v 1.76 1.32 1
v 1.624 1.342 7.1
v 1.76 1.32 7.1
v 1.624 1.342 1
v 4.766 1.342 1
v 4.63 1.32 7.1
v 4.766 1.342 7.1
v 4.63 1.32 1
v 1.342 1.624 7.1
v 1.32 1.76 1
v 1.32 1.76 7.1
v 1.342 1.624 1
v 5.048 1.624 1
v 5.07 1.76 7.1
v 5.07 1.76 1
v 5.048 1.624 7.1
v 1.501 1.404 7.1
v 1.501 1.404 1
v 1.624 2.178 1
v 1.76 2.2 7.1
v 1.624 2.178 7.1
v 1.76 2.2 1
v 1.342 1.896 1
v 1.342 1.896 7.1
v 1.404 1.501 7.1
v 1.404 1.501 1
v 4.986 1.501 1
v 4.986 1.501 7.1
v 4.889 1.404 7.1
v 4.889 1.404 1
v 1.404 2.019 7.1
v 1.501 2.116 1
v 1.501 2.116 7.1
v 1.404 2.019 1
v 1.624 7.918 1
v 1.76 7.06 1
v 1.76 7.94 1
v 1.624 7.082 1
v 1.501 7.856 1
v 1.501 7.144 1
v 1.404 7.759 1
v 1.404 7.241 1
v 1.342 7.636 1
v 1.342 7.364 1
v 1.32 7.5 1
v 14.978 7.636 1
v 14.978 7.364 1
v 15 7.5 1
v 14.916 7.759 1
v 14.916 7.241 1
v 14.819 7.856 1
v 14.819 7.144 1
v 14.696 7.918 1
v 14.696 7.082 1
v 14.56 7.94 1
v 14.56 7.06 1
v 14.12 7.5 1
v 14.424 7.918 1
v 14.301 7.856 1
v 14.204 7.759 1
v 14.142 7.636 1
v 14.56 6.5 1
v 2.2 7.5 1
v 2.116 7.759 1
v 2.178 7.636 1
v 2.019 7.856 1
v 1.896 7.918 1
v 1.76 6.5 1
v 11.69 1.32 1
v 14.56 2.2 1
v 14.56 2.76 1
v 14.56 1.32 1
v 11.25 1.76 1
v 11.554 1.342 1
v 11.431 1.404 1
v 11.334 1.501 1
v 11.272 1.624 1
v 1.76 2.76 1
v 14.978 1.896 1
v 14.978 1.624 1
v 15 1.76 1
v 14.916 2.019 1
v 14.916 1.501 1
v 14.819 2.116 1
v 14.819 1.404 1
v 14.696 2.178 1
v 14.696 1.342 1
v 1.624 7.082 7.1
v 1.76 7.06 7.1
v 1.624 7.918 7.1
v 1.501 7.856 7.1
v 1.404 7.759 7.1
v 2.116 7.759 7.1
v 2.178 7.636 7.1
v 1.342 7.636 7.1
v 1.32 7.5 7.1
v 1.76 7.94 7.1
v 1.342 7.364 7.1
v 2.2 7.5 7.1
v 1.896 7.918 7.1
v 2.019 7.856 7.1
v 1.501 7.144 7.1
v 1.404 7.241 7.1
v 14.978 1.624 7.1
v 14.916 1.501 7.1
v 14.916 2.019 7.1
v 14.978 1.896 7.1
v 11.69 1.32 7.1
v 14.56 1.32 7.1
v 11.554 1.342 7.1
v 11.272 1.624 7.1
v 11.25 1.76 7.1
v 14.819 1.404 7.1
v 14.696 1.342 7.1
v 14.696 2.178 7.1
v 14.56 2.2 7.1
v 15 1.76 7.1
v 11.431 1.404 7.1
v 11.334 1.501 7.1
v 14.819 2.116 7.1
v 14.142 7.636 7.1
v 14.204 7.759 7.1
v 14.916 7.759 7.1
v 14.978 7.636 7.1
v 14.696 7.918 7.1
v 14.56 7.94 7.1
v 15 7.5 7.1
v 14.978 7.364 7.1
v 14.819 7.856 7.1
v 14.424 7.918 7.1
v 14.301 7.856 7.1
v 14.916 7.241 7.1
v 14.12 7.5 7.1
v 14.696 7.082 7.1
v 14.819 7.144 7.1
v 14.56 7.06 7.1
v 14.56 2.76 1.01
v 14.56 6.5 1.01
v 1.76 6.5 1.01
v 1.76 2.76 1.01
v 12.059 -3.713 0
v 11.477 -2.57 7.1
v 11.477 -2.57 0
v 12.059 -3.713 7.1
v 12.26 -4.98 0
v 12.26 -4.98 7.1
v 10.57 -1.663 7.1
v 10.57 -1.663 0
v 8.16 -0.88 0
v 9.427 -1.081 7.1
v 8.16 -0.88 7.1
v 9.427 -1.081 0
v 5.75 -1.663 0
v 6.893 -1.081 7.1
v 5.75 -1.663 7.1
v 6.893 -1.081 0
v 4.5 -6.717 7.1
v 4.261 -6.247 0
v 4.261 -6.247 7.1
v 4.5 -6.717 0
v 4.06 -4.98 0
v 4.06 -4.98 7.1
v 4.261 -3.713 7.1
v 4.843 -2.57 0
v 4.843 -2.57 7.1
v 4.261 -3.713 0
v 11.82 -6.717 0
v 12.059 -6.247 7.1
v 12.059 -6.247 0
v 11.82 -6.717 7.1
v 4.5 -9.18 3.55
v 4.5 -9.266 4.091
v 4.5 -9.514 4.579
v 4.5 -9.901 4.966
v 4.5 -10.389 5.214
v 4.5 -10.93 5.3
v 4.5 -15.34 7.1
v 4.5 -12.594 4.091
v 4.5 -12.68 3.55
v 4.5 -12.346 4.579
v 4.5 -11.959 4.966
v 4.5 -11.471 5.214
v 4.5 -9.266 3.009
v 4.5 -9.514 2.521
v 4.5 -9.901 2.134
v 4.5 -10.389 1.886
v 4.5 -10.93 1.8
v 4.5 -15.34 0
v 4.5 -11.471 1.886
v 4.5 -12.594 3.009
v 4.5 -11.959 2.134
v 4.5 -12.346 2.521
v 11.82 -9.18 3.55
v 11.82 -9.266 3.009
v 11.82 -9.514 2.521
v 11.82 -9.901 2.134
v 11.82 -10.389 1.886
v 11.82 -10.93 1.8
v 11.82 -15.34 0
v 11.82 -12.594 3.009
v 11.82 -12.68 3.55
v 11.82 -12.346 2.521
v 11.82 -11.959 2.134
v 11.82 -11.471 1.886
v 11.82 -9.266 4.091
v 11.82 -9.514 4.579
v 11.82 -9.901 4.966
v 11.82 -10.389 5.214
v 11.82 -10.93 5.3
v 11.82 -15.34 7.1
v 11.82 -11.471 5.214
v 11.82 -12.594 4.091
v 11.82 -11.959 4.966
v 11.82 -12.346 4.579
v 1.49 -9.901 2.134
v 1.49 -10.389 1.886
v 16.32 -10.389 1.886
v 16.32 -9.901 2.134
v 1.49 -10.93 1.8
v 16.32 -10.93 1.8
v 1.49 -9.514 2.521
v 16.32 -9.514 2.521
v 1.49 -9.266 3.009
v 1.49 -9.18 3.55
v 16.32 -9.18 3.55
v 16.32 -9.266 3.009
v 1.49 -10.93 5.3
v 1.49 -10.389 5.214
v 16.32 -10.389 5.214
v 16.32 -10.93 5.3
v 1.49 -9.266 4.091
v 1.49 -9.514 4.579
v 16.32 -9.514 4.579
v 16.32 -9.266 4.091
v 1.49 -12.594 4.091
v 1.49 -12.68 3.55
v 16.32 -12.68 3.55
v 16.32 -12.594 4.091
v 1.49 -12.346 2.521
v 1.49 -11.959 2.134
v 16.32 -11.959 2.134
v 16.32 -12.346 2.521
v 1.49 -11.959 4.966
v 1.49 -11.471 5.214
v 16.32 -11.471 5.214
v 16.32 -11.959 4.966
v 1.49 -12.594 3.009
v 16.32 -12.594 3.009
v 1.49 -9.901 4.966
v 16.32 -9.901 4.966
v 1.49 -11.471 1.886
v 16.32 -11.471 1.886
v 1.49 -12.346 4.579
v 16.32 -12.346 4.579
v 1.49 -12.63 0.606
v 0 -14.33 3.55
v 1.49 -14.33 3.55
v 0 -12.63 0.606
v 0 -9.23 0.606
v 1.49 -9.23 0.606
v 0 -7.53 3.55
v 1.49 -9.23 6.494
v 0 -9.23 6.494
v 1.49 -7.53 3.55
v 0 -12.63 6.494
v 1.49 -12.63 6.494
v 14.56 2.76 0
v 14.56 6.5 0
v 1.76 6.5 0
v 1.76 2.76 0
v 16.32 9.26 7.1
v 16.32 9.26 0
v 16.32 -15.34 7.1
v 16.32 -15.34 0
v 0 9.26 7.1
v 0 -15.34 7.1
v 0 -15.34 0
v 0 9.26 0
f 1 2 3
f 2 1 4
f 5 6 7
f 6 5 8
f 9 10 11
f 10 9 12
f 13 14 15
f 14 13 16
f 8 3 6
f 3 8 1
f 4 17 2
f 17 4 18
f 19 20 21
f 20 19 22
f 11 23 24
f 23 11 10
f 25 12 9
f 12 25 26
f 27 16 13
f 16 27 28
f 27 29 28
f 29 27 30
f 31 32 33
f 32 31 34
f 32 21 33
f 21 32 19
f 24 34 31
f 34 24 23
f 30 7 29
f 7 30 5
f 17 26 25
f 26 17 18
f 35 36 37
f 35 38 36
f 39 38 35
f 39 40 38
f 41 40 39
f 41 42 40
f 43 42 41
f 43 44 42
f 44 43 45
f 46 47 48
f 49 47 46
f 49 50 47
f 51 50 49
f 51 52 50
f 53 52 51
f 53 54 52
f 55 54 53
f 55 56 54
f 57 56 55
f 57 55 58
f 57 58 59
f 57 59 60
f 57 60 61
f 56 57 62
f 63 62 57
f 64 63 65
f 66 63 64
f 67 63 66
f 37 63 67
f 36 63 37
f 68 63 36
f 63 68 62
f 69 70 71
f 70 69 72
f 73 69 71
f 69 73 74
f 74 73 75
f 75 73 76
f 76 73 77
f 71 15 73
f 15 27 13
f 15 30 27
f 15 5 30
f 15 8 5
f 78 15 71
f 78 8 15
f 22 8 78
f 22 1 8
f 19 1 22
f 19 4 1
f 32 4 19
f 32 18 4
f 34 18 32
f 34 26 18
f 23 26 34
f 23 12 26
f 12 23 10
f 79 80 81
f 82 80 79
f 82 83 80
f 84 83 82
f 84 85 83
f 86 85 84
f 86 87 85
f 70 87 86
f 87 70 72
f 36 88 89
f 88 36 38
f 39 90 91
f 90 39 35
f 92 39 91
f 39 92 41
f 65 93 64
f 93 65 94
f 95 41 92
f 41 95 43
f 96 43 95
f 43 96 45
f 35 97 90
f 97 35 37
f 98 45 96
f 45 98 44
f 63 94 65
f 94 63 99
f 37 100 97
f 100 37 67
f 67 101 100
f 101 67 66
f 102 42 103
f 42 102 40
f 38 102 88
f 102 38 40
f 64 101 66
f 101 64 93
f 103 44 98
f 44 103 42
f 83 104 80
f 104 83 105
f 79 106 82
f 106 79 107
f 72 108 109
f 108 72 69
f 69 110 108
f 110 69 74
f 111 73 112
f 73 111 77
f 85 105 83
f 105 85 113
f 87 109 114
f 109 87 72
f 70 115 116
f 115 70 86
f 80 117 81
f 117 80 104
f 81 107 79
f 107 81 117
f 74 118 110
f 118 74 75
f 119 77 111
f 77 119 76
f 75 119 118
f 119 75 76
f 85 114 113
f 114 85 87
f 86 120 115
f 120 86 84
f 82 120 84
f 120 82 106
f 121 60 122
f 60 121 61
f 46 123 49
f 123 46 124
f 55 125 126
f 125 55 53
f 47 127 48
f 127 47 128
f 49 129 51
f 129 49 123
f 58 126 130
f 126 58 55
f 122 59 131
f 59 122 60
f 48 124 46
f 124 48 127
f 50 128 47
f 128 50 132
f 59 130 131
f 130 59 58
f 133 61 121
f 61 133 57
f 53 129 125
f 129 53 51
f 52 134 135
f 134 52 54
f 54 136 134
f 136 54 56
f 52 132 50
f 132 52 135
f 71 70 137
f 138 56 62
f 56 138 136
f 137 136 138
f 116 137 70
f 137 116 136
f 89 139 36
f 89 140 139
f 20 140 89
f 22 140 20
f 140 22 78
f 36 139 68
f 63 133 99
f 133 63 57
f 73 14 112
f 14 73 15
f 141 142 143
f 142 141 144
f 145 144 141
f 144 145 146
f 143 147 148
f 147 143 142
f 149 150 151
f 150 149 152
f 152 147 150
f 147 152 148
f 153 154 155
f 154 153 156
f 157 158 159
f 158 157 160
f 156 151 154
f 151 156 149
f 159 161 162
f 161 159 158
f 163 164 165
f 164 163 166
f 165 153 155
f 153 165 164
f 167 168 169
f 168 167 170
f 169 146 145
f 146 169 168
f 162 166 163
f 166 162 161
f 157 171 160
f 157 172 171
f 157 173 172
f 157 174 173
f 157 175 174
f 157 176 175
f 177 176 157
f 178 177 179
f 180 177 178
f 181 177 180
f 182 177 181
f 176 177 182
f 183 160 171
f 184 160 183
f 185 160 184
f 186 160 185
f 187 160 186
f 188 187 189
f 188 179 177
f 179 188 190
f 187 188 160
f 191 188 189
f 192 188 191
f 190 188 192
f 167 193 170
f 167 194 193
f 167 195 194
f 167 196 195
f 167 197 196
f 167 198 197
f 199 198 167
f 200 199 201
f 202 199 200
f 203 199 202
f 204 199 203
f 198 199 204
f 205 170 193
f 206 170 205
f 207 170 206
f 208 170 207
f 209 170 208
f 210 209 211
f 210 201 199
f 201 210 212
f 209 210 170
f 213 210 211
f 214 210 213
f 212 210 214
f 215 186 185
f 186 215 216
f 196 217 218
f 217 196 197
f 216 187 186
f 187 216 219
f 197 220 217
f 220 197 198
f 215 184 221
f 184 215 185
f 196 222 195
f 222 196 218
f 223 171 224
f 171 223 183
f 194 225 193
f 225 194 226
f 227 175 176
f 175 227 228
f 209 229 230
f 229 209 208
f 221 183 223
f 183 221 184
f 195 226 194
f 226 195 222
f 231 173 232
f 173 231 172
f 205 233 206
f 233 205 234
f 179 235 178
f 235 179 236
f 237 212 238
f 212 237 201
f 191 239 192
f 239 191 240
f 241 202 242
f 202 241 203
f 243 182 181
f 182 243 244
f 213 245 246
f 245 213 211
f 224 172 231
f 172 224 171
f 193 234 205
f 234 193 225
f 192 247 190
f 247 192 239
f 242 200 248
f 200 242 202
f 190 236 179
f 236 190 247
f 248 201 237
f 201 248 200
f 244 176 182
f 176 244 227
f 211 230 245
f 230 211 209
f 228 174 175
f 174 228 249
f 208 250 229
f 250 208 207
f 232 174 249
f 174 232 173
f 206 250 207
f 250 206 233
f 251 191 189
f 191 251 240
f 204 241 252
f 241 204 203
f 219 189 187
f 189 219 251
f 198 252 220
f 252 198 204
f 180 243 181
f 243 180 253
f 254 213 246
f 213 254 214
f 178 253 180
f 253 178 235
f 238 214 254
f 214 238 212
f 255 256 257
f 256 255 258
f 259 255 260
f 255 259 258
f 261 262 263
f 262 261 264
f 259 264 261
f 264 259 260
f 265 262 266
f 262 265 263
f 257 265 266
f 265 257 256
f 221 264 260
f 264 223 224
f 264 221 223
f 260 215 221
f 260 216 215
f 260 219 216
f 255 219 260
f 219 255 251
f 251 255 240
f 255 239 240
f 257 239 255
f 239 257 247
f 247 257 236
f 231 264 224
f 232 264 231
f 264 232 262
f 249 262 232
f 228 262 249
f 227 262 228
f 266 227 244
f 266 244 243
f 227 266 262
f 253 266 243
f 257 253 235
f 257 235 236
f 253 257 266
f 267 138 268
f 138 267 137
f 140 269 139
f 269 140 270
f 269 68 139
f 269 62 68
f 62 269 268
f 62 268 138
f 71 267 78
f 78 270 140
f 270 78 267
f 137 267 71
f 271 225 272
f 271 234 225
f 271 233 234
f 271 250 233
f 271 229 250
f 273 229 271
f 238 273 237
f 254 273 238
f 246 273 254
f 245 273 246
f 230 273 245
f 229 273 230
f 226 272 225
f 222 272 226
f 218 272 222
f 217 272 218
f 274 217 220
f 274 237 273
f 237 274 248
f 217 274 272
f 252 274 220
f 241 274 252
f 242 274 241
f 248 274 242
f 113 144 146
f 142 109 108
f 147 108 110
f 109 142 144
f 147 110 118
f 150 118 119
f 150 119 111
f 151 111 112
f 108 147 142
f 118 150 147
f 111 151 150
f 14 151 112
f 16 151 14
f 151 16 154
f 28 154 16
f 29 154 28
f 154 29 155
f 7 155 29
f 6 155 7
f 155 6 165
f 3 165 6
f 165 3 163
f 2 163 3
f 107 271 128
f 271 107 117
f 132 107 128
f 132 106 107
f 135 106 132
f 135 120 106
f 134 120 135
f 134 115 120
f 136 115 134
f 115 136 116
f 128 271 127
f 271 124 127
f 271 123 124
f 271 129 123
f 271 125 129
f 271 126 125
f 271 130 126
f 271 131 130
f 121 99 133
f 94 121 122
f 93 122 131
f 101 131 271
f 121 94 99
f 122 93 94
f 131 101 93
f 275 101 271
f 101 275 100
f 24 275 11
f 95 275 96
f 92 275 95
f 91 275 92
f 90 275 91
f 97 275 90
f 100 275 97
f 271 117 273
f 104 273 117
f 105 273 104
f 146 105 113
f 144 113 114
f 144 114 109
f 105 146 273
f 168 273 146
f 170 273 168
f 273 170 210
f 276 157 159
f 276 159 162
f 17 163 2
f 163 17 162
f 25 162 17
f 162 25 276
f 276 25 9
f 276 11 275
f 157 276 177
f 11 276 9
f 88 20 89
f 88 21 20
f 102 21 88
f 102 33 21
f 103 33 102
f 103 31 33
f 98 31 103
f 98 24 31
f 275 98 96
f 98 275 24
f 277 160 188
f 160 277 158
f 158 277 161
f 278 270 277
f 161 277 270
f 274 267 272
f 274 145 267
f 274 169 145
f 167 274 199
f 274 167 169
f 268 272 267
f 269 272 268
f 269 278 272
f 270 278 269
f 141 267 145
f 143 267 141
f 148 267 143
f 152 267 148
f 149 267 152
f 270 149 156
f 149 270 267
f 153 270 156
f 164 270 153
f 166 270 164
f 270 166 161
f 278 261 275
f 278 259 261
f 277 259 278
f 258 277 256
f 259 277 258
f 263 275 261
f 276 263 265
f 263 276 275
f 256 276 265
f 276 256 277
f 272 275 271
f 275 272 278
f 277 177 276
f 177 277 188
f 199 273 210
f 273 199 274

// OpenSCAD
// Used for mounting tiny microswitches with no lever
// Michel Pollet <buserror@gmail.com>
// Inspired by
// Ian Stratford <ginjaian@gmail.com>

// for 0.20mm layer, 0.35mm nozzle 00 this ensures "solid walls"
extrusionSize = 0.44;	// for 0.20mm layer

E = 0.01;
$fn = 20;

ms_size = [12.8, 5.74, 6.6]; // exact size = 12.8, 5.8, 6.6

m8_diameter = 8.2;
m3_diameter = 3.5;
m3_nut_diameter = 6.8; // normally 6.2mm
relief_hole_diameter = extrusionSize * 2;

WallW = 4 * extrusionSize;
BottomH = 1;

DistanceSwitchM8 = WallW / 2;
DistanceM3M8 = 0.1;	// the smaller, the better really
NutTrapDepth = 1.5;

ExtraHeight = -0.5;
ExtraLength = 
	m8_diameter + DistanceM3M8 + 
	(m3_nut_diameter/2) + WallW + 
	DistanceSwitchM8 + 1;

ms_outside_pos = [0,-ExtraLength,0];
ms_outside_size = [
	ms_size[0] + (2*WallW), 
	ms_size[1] + (2*WallW) + ExtraLength, 
	ms_size[2] + BottomH + ExtraHeight];
ms_inside_size = [ms_size[0], ms_size[1], ms_size[2] + E];
ms_inside_pos = [
	(ms_outside_size[0] / 2) - (ms_inside_size[0]/2),
	WallW + (ms_size[1] / 2) - (ms_inside_size[1]/2),
	BottomH ];

ms_pin_slot_size = [
	ms_inside_size[0],
	ms_inside_size[1] - 2,
	BottomH + (2*E)];
ms_pin_slot_pos = [
	(ms_outside_size[0] / 2) - (ms_pin_slot_size[0]/2),
	WallW + (ms_size[1] / 2) - (ms_pin_slot_size[1]/2),
	-E];

rod_position = [ ms_outside_size[0] / 2, -DistanceSwitchM8-(m8_diameter / 2), -E ];

m3_position = [-E, 
	-DistanceSwitchM8 - m8_diameter - DistanceM3M8 - (m3_diameter / 2),
	ms_outside_size[2] / 2];
	
difference() {
	outside();
	inside();
}

module outside() {
	translate(ms_outside_pos)
		cube(ms_outside_size);
}

module inside() {
	translate(ms_inside_pos) {
		cube(ms_inside_size);
		if (relief_hole_diameter > 0) {
			for (x = [0:1]) for (y = [0:1])
				translate([x * ms_inside_size[0], y * ms_inside_size[1], 0]) hull() {
					cylinder(r = relief_hole_diameter/2, h = ms_inside_size[2]);
					if (y == 0) {
						translate([(x == 0 ? 1 : -1) * ms_inside_size[1] * 0.5,0,0])
							cylinder(r = relief_hole_diameter/2, h = ms_inside_size[2]);
					}
				}
		}
	}
	translate(ms_pin_slot_pos)
		cube(ms_pin_slot_size);
	
	translate(rod_position) {
		cylinder(r = m8_diameter / 2, h = ms_outside_size[2] + (2*E));
		hull() assign(r = (m8_diameter / 2) - extrusionSize) {
			cylinder(r = r, h = ms_outside_size[2] + (2*E));
			translate([0,-20,0])
				cylinder(r = r, h = ms_outside_size[2] + (2*E));
		}
	}
	translate(m3_position) rotate([0,90,0]) {
		cylinder(r = m3_diameter / 2, h = ms_outside_size[0] + (2*E));
		// cut the nut trap
//		translate([0,0, ms_outside_size[0]-NutTrapDepth])
		rotate([0,0,30])
		cylinder(r = m3_nut_diameter / 2, h = NutTrapDepth, $fn = 6);
	}
}
